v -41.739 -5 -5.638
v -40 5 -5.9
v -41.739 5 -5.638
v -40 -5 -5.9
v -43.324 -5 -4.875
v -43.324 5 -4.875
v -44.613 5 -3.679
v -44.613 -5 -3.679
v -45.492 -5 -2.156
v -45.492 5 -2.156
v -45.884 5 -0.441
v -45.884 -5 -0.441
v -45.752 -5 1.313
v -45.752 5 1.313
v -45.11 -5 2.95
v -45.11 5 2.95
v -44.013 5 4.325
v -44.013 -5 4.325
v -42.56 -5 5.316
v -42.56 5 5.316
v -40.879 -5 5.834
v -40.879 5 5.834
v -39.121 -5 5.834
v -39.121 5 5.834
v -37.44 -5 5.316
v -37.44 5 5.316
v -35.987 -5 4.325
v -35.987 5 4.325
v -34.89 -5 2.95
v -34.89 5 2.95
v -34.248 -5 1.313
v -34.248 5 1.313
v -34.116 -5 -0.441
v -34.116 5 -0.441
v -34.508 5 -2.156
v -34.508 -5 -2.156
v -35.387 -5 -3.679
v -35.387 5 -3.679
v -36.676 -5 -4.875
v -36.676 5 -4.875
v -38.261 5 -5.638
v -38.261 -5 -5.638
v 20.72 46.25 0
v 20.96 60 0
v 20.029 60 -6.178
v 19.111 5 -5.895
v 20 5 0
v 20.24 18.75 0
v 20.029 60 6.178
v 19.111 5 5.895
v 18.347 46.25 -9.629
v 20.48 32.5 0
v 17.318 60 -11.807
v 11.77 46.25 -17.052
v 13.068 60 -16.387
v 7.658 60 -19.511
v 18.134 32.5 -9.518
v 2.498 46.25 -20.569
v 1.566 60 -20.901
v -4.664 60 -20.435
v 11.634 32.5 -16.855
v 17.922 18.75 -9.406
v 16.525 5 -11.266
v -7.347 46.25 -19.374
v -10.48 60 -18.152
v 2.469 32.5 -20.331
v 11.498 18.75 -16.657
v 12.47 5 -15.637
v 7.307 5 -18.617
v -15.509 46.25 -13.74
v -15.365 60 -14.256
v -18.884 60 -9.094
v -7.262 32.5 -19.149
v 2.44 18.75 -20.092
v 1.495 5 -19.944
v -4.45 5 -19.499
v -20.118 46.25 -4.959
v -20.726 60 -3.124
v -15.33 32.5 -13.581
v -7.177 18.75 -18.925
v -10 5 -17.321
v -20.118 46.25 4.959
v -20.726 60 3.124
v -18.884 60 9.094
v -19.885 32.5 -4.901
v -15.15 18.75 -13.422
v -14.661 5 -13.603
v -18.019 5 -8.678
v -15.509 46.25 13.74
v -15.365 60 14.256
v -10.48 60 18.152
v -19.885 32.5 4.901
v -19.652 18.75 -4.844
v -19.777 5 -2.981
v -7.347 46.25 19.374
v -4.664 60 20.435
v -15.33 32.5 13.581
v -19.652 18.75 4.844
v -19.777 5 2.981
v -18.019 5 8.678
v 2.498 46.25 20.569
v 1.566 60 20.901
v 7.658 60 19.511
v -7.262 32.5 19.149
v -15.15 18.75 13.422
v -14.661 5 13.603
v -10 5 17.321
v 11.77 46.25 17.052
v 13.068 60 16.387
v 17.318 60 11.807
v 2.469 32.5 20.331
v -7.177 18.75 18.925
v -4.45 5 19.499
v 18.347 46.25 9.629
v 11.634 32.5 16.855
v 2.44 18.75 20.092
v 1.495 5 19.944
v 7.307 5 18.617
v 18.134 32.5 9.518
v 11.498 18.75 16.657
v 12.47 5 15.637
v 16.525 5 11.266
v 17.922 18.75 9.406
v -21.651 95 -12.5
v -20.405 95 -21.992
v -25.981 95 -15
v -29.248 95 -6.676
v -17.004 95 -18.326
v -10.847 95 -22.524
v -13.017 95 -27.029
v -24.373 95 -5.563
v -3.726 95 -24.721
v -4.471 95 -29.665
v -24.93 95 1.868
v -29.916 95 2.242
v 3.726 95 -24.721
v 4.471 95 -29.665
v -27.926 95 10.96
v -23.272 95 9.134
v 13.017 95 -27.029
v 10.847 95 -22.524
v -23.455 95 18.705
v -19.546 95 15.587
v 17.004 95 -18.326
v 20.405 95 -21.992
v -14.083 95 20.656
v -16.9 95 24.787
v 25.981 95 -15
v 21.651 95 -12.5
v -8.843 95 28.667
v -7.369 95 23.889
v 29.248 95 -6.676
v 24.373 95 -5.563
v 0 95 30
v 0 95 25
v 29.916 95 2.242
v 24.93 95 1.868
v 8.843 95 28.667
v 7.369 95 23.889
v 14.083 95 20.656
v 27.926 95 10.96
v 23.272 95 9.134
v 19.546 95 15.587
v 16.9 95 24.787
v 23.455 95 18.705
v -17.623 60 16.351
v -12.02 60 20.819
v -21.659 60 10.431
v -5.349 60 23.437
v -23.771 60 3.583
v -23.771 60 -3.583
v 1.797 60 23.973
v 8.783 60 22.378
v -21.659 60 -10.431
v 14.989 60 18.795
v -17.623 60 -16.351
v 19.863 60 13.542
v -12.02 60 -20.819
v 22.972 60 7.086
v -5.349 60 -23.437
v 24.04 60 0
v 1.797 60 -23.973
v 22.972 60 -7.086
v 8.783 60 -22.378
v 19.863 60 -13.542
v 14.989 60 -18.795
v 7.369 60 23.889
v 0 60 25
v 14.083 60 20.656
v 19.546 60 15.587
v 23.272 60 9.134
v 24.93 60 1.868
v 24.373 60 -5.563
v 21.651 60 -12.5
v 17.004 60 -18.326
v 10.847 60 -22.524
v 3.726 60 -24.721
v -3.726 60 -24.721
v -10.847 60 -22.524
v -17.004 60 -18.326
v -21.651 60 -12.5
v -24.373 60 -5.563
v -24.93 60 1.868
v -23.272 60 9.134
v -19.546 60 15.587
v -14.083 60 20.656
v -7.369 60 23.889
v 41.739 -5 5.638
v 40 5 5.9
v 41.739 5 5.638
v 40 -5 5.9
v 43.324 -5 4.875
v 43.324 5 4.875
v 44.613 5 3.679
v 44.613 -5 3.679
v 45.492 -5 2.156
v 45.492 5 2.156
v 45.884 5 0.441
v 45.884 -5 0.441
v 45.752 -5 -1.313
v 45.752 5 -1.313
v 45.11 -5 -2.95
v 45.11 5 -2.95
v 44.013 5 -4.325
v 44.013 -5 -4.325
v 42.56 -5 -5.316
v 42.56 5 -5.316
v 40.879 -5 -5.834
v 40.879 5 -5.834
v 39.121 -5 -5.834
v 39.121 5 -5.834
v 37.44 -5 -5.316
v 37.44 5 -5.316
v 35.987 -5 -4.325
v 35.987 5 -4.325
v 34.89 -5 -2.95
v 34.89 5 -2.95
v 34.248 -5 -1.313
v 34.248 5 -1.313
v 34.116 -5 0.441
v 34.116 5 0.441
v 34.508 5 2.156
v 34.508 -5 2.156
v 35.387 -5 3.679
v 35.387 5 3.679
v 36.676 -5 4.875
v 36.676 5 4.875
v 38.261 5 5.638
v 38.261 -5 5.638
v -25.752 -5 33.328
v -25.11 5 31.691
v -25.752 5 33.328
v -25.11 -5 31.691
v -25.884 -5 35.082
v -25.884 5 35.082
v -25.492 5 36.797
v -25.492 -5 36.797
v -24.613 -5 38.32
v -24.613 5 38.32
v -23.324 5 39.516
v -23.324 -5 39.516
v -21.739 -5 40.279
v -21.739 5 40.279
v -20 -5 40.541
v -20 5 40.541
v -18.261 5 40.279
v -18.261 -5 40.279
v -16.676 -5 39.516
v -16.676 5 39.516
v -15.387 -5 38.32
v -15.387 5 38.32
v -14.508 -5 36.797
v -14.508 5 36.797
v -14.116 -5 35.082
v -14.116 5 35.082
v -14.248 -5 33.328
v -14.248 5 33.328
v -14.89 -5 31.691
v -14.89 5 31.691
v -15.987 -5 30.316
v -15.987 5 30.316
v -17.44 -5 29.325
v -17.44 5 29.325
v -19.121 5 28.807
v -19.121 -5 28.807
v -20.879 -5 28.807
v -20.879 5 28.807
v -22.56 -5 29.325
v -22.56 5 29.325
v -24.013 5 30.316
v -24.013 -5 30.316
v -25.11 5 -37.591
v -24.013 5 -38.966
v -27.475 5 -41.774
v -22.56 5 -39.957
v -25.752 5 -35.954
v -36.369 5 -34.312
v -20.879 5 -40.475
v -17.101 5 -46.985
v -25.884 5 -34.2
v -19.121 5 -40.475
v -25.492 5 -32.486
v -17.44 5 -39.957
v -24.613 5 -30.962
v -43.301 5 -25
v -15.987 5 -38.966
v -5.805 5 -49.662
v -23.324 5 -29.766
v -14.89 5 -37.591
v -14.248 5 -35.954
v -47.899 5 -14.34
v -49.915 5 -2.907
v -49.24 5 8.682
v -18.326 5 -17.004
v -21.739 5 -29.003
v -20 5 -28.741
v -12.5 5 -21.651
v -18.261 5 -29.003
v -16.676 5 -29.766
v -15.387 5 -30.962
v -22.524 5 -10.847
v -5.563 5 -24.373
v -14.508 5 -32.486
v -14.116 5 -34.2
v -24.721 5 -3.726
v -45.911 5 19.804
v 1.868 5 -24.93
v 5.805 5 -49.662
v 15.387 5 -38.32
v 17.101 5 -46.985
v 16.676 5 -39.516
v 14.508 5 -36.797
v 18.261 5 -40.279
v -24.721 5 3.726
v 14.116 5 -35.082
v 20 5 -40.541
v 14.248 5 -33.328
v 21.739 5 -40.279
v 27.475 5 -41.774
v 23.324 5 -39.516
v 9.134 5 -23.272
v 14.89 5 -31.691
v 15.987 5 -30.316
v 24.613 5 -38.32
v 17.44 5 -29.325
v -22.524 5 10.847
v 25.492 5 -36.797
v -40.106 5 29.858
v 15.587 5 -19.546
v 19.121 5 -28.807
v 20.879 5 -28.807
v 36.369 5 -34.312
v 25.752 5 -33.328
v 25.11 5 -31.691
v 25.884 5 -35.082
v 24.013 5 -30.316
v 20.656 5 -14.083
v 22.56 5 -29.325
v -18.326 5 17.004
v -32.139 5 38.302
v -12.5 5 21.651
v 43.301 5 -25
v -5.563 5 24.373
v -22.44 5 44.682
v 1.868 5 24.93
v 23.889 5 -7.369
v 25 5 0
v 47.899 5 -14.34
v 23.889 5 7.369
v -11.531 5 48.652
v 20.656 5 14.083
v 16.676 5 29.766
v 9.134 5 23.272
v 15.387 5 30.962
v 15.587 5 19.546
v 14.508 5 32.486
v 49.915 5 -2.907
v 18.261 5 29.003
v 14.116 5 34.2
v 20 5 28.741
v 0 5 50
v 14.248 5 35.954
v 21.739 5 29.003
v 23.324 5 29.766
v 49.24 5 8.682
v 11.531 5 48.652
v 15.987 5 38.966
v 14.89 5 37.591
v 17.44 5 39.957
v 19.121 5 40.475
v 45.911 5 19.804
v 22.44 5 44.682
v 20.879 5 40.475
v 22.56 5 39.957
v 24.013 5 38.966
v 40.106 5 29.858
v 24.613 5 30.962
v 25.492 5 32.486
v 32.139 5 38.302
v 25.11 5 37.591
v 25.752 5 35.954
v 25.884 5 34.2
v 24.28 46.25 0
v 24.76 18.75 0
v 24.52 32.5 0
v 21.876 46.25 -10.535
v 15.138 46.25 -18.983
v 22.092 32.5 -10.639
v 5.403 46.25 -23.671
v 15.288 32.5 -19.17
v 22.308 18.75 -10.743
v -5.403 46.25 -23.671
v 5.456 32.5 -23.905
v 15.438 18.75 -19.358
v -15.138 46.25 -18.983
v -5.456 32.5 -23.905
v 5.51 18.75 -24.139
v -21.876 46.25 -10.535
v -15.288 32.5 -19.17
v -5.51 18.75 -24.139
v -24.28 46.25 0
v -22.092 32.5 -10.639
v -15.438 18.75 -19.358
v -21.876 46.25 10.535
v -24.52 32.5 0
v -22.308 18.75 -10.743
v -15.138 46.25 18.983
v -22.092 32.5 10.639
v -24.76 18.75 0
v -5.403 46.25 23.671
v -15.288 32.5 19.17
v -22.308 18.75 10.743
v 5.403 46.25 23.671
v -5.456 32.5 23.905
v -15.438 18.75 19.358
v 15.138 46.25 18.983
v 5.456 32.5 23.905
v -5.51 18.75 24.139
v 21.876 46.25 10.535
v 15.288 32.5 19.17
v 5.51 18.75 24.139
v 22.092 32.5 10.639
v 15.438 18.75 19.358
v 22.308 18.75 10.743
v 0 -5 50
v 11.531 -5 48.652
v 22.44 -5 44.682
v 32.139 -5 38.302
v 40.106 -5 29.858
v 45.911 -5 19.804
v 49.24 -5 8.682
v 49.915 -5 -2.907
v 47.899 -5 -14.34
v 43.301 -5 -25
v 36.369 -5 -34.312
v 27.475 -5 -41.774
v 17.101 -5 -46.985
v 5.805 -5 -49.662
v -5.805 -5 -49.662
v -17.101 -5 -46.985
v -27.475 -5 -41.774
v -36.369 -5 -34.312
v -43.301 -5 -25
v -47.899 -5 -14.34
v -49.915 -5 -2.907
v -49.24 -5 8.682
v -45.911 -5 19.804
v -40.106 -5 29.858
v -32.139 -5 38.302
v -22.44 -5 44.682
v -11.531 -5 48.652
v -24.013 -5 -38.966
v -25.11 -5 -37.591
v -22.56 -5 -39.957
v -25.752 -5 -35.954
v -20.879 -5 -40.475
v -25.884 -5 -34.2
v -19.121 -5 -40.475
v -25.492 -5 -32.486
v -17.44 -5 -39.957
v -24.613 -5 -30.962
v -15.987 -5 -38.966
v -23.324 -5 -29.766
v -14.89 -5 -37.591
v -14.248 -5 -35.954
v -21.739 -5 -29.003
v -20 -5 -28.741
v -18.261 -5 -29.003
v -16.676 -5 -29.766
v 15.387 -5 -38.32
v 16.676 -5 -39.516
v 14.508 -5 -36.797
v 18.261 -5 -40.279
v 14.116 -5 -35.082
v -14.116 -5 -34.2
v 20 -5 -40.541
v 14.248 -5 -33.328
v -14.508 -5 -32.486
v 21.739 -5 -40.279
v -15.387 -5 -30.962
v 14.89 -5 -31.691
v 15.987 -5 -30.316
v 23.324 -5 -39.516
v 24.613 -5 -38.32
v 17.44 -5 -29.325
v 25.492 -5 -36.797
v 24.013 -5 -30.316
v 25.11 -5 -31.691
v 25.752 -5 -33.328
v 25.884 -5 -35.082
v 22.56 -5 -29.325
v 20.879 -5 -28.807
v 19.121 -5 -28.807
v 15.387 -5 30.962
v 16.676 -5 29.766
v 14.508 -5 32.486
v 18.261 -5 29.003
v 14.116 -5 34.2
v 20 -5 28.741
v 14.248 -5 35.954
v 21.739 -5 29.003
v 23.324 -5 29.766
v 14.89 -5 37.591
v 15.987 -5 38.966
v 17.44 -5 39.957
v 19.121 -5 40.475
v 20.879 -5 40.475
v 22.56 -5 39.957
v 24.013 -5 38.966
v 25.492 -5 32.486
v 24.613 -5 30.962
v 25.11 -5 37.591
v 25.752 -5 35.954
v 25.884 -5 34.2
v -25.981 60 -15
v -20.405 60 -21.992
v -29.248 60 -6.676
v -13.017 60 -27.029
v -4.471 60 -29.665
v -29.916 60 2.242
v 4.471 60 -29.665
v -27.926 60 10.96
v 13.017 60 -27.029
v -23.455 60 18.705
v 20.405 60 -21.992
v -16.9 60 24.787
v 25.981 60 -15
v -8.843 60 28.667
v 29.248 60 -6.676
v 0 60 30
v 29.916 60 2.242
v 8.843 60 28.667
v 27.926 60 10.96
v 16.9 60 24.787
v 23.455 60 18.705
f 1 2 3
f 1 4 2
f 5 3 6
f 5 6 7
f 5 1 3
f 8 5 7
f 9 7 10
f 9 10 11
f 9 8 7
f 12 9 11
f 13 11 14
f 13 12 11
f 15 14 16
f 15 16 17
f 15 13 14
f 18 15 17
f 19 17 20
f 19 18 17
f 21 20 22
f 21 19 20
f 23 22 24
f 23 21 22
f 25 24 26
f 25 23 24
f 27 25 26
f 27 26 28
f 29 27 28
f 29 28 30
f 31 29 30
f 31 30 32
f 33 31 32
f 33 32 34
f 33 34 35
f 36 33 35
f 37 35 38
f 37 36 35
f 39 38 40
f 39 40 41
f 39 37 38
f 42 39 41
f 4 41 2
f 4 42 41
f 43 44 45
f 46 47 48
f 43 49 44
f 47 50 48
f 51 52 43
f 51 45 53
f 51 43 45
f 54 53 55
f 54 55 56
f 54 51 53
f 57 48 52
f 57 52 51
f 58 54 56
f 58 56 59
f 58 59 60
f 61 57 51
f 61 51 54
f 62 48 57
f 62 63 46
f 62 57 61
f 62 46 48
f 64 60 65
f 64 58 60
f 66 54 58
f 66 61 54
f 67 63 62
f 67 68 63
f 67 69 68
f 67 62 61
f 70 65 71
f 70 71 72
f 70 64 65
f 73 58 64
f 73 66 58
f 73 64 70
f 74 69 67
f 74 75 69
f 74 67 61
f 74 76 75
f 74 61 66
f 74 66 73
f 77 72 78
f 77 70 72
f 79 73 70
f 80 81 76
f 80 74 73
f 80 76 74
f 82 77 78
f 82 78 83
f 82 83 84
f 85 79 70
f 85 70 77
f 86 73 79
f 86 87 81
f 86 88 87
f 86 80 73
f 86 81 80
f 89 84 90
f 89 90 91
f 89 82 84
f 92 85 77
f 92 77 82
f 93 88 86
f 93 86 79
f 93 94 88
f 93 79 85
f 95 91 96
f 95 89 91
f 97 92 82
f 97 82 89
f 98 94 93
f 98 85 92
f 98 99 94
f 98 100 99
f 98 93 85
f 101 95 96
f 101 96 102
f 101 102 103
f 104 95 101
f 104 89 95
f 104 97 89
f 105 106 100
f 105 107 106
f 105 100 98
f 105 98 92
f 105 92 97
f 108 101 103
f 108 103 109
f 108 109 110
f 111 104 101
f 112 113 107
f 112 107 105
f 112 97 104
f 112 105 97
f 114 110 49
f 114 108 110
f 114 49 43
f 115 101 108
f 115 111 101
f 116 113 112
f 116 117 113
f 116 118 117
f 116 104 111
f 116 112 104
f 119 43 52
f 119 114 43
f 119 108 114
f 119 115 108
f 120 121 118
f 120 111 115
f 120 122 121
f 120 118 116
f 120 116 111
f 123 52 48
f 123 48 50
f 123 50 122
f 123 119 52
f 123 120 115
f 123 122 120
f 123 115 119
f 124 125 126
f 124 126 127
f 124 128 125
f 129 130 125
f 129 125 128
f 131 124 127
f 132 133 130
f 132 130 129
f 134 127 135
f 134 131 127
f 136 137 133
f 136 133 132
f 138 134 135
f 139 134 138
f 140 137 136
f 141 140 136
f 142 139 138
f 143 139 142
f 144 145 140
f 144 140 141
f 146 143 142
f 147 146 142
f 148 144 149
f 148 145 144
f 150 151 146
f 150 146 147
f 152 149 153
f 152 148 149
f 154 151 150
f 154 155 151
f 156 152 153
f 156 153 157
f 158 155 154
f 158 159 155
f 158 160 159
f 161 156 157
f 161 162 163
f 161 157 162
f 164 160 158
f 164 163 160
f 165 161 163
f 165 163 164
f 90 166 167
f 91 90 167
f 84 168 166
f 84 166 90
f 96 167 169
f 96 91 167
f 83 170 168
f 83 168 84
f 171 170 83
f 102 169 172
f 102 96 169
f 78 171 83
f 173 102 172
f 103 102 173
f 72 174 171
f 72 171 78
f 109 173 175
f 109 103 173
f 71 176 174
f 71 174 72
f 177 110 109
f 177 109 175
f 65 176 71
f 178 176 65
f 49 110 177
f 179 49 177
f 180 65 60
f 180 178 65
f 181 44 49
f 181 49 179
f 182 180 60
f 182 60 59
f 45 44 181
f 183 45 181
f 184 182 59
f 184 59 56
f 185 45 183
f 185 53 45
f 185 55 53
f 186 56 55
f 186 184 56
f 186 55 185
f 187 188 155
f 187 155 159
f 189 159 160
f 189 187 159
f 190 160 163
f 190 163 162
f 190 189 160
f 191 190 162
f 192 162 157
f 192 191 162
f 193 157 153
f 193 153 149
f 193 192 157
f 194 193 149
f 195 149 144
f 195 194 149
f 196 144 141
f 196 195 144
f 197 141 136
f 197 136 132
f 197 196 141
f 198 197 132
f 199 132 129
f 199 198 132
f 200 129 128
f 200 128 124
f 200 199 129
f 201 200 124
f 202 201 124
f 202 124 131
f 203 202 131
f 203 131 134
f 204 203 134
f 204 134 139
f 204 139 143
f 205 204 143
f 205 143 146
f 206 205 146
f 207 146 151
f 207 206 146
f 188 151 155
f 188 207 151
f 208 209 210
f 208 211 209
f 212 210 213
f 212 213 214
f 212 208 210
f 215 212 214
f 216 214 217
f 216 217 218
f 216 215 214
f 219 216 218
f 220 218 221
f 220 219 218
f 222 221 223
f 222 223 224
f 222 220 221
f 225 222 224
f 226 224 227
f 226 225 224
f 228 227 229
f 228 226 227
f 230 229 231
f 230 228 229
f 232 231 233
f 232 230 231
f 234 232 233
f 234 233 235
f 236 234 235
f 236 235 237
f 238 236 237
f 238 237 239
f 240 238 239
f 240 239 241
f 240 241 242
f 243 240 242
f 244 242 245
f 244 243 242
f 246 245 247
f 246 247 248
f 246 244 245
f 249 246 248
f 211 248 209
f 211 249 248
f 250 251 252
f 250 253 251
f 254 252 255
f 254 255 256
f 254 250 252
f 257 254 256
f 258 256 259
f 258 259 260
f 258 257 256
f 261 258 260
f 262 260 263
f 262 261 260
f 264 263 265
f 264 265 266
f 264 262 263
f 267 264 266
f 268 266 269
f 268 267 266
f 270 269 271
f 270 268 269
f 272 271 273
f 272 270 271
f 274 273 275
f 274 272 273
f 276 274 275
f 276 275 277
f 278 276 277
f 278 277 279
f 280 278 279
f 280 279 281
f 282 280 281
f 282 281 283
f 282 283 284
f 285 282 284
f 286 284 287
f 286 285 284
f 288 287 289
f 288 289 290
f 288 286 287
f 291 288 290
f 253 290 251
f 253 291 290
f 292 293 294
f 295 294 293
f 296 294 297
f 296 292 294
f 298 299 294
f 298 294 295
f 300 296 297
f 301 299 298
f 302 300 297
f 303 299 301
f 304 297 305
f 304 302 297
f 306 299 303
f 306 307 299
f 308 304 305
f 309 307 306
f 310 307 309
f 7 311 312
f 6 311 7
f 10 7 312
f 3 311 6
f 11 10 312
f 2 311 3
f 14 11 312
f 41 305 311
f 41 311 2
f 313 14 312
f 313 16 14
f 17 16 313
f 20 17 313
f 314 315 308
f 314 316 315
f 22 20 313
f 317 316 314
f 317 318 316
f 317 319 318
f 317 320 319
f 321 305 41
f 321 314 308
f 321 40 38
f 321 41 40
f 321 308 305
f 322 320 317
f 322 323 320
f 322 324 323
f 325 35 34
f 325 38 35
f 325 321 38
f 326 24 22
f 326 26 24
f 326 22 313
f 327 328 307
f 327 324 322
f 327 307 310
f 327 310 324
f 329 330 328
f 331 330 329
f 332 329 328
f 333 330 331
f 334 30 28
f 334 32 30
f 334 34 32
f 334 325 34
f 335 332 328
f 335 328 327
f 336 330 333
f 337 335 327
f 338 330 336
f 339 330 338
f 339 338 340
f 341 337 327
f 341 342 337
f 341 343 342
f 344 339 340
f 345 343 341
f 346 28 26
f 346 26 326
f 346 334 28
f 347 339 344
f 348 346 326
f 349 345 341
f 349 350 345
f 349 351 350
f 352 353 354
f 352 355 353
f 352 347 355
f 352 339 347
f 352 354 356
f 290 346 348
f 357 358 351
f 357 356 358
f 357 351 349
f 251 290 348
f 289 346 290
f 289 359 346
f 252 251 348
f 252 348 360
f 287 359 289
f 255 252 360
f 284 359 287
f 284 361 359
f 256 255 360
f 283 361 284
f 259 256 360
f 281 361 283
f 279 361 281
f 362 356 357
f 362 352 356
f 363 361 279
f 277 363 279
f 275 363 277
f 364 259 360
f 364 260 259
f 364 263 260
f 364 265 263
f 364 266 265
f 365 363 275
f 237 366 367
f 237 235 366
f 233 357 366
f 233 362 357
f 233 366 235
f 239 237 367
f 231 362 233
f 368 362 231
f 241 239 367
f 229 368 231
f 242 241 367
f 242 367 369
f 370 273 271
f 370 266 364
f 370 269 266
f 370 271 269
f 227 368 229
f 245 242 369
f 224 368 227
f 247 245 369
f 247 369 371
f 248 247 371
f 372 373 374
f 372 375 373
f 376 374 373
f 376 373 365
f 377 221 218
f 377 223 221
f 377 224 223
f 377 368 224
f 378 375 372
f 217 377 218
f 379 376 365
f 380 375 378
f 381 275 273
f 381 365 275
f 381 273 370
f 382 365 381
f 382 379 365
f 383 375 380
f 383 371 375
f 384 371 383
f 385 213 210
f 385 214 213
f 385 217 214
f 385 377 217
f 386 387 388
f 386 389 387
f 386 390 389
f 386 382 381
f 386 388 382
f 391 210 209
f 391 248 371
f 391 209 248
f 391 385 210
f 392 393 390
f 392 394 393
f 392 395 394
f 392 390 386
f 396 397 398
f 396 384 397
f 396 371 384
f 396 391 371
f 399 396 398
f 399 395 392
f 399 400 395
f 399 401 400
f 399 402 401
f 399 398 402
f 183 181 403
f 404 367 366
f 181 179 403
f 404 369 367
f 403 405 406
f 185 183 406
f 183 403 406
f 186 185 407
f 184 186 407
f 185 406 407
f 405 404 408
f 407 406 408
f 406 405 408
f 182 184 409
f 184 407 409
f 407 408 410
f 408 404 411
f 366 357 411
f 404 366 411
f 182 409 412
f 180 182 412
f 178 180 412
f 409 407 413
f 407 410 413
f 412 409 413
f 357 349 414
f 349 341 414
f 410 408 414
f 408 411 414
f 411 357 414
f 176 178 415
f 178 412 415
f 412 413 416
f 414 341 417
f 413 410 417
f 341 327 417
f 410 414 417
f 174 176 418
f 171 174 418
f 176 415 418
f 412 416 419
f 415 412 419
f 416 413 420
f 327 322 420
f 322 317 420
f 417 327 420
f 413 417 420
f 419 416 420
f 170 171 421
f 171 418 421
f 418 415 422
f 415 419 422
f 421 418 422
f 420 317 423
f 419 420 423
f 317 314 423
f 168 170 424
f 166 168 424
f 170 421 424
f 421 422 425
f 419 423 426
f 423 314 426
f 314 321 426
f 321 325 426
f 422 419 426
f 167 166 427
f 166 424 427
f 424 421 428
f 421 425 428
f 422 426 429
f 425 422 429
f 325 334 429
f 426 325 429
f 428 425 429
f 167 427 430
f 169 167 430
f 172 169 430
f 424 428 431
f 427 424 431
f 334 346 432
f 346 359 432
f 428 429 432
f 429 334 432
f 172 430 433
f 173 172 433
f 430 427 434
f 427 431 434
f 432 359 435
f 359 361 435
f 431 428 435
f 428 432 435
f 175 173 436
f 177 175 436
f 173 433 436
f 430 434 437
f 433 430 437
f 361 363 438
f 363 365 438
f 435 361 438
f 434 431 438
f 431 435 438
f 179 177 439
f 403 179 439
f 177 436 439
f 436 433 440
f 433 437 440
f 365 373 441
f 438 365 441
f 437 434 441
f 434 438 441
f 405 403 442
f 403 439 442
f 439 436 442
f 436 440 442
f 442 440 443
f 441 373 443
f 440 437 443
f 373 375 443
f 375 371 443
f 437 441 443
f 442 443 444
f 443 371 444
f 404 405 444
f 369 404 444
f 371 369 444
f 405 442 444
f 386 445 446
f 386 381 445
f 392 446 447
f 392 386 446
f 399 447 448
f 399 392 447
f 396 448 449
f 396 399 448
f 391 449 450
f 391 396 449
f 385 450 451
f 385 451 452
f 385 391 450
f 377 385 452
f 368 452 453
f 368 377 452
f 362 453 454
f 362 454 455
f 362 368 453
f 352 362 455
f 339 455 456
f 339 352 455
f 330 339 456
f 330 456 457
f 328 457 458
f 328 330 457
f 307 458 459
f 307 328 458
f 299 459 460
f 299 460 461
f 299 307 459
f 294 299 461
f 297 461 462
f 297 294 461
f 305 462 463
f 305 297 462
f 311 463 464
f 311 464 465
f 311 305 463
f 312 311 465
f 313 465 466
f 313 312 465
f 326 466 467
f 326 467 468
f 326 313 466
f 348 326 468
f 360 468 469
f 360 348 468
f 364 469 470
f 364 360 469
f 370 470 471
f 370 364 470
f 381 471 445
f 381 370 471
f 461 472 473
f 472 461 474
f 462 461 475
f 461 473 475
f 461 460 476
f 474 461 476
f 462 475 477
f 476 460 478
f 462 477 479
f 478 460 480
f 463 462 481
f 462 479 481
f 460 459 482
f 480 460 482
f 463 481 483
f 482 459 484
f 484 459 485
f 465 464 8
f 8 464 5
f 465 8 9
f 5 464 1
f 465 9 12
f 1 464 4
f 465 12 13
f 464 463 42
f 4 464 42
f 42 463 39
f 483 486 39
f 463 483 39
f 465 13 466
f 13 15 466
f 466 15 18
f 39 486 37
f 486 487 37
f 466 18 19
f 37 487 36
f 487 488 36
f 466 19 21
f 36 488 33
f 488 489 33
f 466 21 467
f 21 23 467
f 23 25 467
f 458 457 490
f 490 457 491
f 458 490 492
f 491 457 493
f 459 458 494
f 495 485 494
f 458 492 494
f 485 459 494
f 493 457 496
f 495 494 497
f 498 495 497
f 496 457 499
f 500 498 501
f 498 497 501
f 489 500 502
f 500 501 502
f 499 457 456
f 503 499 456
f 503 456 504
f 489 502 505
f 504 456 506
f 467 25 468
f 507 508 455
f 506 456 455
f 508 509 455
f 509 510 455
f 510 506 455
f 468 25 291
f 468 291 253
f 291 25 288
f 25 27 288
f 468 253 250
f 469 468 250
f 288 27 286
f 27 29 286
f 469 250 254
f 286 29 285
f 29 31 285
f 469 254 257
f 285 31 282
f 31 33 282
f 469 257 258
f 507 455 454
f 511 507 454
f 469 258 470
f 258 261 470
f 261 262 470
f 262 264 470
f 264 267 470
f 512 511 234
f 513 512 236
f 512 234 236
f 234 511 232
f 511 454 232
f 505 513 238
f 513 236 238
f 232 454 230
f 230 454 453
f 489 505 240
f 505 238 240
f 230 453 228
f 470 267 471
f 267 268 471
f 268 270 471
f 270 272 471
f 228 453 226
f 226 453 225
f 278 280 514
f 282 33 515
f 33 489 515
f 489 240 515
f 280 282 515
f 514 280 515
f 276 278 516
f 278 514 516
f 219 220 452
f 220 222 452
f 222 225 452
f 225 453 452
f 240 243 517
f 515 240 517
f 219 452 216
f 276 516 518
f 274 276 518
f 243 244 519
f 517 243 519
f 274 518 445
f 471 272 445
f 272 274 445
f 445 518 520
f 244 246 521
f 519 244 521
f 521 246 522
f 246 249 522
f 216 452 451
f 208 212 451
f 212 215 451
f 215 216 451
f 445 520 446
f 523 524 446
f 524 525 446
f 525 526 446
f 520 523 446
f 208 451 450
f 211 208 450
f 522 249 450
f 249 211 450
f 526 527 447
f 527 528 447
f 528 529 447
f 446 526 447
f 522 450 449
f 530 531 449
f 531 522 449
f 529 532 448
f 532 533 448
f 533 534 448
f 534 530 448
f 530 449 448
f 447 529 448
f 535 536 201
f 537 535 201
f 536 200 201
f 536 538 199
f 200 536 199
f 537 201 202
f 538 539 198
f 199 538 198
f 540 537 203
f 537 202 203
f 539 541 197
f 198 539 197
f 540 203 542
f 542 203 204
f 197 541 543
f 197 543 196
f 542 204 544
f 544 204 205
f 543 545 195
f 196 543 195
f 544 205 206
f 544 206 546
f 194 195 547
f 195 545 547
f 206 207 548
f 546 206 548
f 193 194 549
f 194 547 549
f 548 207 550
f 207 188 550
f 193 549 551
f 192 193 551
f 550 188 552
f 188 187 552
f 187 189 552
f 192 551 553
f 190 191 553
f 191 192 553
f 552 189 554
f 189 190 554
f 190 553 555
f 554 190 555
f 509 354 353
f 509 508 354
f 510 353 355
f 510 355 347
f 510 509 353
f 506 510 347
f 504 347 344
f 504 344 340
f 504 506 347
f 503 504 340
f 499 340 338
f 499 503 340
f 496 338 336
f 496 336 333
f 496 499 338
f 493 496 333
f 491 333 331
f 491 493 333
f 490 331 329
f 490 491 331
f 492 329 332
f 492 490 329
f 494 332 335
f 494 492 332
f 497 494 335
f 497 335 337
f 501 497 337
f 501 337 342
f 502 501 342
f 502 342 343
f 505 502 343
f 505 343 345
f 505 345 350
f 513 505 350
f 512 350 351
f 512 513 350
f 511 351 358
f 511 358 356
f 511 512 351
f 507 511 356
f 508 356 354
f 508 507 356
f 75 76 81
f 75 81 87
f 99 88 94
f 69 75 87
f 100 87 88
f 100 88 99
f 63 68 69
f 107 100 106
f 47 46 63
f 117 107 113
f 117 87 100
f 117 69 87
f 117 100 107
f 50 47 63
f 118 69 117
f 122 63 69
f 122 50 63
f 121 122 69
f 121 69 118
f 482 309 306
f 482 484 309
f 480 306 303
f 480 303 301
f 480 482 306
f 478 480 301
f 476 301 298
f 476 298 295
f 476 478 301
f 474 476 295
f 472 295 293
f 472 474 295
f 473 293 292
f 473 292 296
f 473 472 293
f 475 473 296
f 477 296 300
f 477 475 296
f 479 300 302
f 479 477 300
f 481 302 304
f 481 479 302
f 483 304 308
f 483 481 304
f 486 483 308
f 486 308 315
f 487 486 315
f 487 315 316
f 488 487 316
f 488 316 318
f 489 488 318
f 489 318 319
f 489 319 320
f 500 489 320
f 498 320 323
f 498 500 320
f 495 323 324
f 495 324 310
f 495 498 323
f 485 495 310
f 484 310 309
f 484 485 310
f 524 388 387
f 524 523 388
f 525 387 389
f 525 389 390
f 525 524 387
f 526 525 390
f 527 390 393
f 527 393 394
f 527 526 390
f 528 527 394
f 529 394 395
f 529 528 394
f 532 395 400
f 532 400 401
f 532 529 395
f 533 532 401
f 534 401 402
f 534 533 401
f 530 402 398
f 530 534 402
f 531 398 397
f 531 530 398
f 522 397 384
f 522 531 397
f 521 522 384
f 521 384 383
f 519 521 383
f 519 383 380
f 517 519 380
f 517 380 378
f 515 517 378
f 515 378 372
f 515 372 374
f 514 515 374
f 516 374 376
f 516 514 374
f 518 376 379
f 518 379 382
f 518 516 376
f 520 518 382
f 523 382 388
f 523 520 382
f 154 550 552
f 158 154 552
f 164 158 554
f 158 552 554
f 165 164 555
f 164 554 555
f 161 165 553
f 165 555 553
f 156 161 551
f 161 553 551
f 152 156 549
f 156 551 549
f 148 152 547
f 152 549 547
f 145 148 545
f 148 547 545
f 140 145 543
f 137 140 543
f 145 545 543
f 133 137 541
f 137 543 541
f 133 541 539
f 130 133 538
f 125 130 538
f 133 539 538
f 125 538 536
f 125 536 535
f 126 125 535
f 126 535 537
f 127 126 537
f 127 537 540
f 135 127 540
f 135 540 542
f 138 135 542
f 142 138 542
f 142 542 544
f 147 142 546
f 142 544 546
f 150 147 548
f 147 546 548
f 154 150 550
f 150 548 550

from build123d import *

# Parameters (mm, degrees)
SKETCH1_R           = 50
BOSS_EXTRUDE1_DEPTH = 5
SKETCH2_R           = 25
SKETCH2_R_2         = 20
BOSS_EXTRUDE2_DEPTH = 55
BOSS_EXTRUDE2_DRAFT = 1
SKETCH3_R           = 30
SKETCH3_R_2         = 25
BOSS_EXTRUDE3_DEPTH = 35
SKETCH5_W           = 5.9
SKETCH5_H           = 10
CIRPATTERN1_COUNT   = 6


with BuildPart() as part:
    # Sketch1 → Boss-Extrude1 (new, symmetric)
    with BuildSketch(Plane(origin=(0, 0, 0), x_dir=(1, 0, 0), z_dir=(0, 1, 0))):
        with Locations(Location((0, 0, 0), (0, 0, 270))):
            Circle(SKETCH1_R)
    extrude(amount=BOSS_EXTRUDE1_DEPTH, both=True)


with BuildPart() as boss_extrude2_tool:
    # Sketch2 → Boss-Extrude2 (with draft: the straight prism first)
    with BuildSketch(Plane(origin=(0, 5, 0), x_dir=(1, 0, 0), z_dir=(0, 1, 0))):
        Circle(SKETCH2_R)
        Circle(SKETCH2_R_2, mode=Mode.SUBTRACT)
    extrude(amount=BOSS_EXTRUDE2_DEPTH)
    # Boss-Extrude2: the draft: its side faces are tilted about the plane it starts from
    boss_extrude2_sides = [boss_extrude2_tool.faces().sort_by_distance(p)[0] for p in [
        (-25, 32.5, 0),
        (-20, 32.5, 0),
    ]]
    draft(boss_extrude2_sides, Plane(origin=(0, 5, 0), x_dir=(1, 0, 0), z_dir=(0, 1, 0)), BOSS_EXTRUDE2_DRAFT)


with BuildPart() as part_1:
    add(part.part)

    # Boss-Extrude2: add boss_extrude2_tool
    add(boss_extrude2_tool.part)

    # Sketch5 → Hole1 (revolve, cut)
    with BuildSketch(Plane(origin=(40, 5, 0), x_dir=(0, 0, 1), z_dir=(1, 0, 0))):
        with Locations((2.95, 5)):
            Rectangle(SKETCH5_W, SKETCH5_H)
    hole1 = revolve(axis=Axis((40, -105, 0), (0, 1, 0)), mode=Mode.SUBTRACT)

    # CirPattern1: Hole1 ×6 about axis
    cirpattern1_axis = Axis((0, 0, 0), (0, 1, 0))
    for i in range(1, CIRPATTERN1_COUNT):
        add(hole1.rotate(cirpattern1_axis, i * 360 / CIRPATTERN1_COUNT), mode=Mode.SUBTRACT)


with BuildPart() as body_2:
    # Sketch3 → Boss-Extrude3 (new body)
    with BuildSketch(Plane(origin=(0, 60, 0), x_dir=(1, 0, 0), z_dir=(0, 1, 0))):
        with Locations(Location((0, 0, 0), (0, 0, 270))):
            Circle(SKETCH3_R)
        with Locations(Location((0, 0, 0), (0, 0, 270))):
            Circle(SKETCH3_R_2, mode=Mode.SUBTRACT)
    extrude(amount=BOSS_EXTRUDE3_DEPTH)


solid = Compound([part_1.part, body_2.part])
